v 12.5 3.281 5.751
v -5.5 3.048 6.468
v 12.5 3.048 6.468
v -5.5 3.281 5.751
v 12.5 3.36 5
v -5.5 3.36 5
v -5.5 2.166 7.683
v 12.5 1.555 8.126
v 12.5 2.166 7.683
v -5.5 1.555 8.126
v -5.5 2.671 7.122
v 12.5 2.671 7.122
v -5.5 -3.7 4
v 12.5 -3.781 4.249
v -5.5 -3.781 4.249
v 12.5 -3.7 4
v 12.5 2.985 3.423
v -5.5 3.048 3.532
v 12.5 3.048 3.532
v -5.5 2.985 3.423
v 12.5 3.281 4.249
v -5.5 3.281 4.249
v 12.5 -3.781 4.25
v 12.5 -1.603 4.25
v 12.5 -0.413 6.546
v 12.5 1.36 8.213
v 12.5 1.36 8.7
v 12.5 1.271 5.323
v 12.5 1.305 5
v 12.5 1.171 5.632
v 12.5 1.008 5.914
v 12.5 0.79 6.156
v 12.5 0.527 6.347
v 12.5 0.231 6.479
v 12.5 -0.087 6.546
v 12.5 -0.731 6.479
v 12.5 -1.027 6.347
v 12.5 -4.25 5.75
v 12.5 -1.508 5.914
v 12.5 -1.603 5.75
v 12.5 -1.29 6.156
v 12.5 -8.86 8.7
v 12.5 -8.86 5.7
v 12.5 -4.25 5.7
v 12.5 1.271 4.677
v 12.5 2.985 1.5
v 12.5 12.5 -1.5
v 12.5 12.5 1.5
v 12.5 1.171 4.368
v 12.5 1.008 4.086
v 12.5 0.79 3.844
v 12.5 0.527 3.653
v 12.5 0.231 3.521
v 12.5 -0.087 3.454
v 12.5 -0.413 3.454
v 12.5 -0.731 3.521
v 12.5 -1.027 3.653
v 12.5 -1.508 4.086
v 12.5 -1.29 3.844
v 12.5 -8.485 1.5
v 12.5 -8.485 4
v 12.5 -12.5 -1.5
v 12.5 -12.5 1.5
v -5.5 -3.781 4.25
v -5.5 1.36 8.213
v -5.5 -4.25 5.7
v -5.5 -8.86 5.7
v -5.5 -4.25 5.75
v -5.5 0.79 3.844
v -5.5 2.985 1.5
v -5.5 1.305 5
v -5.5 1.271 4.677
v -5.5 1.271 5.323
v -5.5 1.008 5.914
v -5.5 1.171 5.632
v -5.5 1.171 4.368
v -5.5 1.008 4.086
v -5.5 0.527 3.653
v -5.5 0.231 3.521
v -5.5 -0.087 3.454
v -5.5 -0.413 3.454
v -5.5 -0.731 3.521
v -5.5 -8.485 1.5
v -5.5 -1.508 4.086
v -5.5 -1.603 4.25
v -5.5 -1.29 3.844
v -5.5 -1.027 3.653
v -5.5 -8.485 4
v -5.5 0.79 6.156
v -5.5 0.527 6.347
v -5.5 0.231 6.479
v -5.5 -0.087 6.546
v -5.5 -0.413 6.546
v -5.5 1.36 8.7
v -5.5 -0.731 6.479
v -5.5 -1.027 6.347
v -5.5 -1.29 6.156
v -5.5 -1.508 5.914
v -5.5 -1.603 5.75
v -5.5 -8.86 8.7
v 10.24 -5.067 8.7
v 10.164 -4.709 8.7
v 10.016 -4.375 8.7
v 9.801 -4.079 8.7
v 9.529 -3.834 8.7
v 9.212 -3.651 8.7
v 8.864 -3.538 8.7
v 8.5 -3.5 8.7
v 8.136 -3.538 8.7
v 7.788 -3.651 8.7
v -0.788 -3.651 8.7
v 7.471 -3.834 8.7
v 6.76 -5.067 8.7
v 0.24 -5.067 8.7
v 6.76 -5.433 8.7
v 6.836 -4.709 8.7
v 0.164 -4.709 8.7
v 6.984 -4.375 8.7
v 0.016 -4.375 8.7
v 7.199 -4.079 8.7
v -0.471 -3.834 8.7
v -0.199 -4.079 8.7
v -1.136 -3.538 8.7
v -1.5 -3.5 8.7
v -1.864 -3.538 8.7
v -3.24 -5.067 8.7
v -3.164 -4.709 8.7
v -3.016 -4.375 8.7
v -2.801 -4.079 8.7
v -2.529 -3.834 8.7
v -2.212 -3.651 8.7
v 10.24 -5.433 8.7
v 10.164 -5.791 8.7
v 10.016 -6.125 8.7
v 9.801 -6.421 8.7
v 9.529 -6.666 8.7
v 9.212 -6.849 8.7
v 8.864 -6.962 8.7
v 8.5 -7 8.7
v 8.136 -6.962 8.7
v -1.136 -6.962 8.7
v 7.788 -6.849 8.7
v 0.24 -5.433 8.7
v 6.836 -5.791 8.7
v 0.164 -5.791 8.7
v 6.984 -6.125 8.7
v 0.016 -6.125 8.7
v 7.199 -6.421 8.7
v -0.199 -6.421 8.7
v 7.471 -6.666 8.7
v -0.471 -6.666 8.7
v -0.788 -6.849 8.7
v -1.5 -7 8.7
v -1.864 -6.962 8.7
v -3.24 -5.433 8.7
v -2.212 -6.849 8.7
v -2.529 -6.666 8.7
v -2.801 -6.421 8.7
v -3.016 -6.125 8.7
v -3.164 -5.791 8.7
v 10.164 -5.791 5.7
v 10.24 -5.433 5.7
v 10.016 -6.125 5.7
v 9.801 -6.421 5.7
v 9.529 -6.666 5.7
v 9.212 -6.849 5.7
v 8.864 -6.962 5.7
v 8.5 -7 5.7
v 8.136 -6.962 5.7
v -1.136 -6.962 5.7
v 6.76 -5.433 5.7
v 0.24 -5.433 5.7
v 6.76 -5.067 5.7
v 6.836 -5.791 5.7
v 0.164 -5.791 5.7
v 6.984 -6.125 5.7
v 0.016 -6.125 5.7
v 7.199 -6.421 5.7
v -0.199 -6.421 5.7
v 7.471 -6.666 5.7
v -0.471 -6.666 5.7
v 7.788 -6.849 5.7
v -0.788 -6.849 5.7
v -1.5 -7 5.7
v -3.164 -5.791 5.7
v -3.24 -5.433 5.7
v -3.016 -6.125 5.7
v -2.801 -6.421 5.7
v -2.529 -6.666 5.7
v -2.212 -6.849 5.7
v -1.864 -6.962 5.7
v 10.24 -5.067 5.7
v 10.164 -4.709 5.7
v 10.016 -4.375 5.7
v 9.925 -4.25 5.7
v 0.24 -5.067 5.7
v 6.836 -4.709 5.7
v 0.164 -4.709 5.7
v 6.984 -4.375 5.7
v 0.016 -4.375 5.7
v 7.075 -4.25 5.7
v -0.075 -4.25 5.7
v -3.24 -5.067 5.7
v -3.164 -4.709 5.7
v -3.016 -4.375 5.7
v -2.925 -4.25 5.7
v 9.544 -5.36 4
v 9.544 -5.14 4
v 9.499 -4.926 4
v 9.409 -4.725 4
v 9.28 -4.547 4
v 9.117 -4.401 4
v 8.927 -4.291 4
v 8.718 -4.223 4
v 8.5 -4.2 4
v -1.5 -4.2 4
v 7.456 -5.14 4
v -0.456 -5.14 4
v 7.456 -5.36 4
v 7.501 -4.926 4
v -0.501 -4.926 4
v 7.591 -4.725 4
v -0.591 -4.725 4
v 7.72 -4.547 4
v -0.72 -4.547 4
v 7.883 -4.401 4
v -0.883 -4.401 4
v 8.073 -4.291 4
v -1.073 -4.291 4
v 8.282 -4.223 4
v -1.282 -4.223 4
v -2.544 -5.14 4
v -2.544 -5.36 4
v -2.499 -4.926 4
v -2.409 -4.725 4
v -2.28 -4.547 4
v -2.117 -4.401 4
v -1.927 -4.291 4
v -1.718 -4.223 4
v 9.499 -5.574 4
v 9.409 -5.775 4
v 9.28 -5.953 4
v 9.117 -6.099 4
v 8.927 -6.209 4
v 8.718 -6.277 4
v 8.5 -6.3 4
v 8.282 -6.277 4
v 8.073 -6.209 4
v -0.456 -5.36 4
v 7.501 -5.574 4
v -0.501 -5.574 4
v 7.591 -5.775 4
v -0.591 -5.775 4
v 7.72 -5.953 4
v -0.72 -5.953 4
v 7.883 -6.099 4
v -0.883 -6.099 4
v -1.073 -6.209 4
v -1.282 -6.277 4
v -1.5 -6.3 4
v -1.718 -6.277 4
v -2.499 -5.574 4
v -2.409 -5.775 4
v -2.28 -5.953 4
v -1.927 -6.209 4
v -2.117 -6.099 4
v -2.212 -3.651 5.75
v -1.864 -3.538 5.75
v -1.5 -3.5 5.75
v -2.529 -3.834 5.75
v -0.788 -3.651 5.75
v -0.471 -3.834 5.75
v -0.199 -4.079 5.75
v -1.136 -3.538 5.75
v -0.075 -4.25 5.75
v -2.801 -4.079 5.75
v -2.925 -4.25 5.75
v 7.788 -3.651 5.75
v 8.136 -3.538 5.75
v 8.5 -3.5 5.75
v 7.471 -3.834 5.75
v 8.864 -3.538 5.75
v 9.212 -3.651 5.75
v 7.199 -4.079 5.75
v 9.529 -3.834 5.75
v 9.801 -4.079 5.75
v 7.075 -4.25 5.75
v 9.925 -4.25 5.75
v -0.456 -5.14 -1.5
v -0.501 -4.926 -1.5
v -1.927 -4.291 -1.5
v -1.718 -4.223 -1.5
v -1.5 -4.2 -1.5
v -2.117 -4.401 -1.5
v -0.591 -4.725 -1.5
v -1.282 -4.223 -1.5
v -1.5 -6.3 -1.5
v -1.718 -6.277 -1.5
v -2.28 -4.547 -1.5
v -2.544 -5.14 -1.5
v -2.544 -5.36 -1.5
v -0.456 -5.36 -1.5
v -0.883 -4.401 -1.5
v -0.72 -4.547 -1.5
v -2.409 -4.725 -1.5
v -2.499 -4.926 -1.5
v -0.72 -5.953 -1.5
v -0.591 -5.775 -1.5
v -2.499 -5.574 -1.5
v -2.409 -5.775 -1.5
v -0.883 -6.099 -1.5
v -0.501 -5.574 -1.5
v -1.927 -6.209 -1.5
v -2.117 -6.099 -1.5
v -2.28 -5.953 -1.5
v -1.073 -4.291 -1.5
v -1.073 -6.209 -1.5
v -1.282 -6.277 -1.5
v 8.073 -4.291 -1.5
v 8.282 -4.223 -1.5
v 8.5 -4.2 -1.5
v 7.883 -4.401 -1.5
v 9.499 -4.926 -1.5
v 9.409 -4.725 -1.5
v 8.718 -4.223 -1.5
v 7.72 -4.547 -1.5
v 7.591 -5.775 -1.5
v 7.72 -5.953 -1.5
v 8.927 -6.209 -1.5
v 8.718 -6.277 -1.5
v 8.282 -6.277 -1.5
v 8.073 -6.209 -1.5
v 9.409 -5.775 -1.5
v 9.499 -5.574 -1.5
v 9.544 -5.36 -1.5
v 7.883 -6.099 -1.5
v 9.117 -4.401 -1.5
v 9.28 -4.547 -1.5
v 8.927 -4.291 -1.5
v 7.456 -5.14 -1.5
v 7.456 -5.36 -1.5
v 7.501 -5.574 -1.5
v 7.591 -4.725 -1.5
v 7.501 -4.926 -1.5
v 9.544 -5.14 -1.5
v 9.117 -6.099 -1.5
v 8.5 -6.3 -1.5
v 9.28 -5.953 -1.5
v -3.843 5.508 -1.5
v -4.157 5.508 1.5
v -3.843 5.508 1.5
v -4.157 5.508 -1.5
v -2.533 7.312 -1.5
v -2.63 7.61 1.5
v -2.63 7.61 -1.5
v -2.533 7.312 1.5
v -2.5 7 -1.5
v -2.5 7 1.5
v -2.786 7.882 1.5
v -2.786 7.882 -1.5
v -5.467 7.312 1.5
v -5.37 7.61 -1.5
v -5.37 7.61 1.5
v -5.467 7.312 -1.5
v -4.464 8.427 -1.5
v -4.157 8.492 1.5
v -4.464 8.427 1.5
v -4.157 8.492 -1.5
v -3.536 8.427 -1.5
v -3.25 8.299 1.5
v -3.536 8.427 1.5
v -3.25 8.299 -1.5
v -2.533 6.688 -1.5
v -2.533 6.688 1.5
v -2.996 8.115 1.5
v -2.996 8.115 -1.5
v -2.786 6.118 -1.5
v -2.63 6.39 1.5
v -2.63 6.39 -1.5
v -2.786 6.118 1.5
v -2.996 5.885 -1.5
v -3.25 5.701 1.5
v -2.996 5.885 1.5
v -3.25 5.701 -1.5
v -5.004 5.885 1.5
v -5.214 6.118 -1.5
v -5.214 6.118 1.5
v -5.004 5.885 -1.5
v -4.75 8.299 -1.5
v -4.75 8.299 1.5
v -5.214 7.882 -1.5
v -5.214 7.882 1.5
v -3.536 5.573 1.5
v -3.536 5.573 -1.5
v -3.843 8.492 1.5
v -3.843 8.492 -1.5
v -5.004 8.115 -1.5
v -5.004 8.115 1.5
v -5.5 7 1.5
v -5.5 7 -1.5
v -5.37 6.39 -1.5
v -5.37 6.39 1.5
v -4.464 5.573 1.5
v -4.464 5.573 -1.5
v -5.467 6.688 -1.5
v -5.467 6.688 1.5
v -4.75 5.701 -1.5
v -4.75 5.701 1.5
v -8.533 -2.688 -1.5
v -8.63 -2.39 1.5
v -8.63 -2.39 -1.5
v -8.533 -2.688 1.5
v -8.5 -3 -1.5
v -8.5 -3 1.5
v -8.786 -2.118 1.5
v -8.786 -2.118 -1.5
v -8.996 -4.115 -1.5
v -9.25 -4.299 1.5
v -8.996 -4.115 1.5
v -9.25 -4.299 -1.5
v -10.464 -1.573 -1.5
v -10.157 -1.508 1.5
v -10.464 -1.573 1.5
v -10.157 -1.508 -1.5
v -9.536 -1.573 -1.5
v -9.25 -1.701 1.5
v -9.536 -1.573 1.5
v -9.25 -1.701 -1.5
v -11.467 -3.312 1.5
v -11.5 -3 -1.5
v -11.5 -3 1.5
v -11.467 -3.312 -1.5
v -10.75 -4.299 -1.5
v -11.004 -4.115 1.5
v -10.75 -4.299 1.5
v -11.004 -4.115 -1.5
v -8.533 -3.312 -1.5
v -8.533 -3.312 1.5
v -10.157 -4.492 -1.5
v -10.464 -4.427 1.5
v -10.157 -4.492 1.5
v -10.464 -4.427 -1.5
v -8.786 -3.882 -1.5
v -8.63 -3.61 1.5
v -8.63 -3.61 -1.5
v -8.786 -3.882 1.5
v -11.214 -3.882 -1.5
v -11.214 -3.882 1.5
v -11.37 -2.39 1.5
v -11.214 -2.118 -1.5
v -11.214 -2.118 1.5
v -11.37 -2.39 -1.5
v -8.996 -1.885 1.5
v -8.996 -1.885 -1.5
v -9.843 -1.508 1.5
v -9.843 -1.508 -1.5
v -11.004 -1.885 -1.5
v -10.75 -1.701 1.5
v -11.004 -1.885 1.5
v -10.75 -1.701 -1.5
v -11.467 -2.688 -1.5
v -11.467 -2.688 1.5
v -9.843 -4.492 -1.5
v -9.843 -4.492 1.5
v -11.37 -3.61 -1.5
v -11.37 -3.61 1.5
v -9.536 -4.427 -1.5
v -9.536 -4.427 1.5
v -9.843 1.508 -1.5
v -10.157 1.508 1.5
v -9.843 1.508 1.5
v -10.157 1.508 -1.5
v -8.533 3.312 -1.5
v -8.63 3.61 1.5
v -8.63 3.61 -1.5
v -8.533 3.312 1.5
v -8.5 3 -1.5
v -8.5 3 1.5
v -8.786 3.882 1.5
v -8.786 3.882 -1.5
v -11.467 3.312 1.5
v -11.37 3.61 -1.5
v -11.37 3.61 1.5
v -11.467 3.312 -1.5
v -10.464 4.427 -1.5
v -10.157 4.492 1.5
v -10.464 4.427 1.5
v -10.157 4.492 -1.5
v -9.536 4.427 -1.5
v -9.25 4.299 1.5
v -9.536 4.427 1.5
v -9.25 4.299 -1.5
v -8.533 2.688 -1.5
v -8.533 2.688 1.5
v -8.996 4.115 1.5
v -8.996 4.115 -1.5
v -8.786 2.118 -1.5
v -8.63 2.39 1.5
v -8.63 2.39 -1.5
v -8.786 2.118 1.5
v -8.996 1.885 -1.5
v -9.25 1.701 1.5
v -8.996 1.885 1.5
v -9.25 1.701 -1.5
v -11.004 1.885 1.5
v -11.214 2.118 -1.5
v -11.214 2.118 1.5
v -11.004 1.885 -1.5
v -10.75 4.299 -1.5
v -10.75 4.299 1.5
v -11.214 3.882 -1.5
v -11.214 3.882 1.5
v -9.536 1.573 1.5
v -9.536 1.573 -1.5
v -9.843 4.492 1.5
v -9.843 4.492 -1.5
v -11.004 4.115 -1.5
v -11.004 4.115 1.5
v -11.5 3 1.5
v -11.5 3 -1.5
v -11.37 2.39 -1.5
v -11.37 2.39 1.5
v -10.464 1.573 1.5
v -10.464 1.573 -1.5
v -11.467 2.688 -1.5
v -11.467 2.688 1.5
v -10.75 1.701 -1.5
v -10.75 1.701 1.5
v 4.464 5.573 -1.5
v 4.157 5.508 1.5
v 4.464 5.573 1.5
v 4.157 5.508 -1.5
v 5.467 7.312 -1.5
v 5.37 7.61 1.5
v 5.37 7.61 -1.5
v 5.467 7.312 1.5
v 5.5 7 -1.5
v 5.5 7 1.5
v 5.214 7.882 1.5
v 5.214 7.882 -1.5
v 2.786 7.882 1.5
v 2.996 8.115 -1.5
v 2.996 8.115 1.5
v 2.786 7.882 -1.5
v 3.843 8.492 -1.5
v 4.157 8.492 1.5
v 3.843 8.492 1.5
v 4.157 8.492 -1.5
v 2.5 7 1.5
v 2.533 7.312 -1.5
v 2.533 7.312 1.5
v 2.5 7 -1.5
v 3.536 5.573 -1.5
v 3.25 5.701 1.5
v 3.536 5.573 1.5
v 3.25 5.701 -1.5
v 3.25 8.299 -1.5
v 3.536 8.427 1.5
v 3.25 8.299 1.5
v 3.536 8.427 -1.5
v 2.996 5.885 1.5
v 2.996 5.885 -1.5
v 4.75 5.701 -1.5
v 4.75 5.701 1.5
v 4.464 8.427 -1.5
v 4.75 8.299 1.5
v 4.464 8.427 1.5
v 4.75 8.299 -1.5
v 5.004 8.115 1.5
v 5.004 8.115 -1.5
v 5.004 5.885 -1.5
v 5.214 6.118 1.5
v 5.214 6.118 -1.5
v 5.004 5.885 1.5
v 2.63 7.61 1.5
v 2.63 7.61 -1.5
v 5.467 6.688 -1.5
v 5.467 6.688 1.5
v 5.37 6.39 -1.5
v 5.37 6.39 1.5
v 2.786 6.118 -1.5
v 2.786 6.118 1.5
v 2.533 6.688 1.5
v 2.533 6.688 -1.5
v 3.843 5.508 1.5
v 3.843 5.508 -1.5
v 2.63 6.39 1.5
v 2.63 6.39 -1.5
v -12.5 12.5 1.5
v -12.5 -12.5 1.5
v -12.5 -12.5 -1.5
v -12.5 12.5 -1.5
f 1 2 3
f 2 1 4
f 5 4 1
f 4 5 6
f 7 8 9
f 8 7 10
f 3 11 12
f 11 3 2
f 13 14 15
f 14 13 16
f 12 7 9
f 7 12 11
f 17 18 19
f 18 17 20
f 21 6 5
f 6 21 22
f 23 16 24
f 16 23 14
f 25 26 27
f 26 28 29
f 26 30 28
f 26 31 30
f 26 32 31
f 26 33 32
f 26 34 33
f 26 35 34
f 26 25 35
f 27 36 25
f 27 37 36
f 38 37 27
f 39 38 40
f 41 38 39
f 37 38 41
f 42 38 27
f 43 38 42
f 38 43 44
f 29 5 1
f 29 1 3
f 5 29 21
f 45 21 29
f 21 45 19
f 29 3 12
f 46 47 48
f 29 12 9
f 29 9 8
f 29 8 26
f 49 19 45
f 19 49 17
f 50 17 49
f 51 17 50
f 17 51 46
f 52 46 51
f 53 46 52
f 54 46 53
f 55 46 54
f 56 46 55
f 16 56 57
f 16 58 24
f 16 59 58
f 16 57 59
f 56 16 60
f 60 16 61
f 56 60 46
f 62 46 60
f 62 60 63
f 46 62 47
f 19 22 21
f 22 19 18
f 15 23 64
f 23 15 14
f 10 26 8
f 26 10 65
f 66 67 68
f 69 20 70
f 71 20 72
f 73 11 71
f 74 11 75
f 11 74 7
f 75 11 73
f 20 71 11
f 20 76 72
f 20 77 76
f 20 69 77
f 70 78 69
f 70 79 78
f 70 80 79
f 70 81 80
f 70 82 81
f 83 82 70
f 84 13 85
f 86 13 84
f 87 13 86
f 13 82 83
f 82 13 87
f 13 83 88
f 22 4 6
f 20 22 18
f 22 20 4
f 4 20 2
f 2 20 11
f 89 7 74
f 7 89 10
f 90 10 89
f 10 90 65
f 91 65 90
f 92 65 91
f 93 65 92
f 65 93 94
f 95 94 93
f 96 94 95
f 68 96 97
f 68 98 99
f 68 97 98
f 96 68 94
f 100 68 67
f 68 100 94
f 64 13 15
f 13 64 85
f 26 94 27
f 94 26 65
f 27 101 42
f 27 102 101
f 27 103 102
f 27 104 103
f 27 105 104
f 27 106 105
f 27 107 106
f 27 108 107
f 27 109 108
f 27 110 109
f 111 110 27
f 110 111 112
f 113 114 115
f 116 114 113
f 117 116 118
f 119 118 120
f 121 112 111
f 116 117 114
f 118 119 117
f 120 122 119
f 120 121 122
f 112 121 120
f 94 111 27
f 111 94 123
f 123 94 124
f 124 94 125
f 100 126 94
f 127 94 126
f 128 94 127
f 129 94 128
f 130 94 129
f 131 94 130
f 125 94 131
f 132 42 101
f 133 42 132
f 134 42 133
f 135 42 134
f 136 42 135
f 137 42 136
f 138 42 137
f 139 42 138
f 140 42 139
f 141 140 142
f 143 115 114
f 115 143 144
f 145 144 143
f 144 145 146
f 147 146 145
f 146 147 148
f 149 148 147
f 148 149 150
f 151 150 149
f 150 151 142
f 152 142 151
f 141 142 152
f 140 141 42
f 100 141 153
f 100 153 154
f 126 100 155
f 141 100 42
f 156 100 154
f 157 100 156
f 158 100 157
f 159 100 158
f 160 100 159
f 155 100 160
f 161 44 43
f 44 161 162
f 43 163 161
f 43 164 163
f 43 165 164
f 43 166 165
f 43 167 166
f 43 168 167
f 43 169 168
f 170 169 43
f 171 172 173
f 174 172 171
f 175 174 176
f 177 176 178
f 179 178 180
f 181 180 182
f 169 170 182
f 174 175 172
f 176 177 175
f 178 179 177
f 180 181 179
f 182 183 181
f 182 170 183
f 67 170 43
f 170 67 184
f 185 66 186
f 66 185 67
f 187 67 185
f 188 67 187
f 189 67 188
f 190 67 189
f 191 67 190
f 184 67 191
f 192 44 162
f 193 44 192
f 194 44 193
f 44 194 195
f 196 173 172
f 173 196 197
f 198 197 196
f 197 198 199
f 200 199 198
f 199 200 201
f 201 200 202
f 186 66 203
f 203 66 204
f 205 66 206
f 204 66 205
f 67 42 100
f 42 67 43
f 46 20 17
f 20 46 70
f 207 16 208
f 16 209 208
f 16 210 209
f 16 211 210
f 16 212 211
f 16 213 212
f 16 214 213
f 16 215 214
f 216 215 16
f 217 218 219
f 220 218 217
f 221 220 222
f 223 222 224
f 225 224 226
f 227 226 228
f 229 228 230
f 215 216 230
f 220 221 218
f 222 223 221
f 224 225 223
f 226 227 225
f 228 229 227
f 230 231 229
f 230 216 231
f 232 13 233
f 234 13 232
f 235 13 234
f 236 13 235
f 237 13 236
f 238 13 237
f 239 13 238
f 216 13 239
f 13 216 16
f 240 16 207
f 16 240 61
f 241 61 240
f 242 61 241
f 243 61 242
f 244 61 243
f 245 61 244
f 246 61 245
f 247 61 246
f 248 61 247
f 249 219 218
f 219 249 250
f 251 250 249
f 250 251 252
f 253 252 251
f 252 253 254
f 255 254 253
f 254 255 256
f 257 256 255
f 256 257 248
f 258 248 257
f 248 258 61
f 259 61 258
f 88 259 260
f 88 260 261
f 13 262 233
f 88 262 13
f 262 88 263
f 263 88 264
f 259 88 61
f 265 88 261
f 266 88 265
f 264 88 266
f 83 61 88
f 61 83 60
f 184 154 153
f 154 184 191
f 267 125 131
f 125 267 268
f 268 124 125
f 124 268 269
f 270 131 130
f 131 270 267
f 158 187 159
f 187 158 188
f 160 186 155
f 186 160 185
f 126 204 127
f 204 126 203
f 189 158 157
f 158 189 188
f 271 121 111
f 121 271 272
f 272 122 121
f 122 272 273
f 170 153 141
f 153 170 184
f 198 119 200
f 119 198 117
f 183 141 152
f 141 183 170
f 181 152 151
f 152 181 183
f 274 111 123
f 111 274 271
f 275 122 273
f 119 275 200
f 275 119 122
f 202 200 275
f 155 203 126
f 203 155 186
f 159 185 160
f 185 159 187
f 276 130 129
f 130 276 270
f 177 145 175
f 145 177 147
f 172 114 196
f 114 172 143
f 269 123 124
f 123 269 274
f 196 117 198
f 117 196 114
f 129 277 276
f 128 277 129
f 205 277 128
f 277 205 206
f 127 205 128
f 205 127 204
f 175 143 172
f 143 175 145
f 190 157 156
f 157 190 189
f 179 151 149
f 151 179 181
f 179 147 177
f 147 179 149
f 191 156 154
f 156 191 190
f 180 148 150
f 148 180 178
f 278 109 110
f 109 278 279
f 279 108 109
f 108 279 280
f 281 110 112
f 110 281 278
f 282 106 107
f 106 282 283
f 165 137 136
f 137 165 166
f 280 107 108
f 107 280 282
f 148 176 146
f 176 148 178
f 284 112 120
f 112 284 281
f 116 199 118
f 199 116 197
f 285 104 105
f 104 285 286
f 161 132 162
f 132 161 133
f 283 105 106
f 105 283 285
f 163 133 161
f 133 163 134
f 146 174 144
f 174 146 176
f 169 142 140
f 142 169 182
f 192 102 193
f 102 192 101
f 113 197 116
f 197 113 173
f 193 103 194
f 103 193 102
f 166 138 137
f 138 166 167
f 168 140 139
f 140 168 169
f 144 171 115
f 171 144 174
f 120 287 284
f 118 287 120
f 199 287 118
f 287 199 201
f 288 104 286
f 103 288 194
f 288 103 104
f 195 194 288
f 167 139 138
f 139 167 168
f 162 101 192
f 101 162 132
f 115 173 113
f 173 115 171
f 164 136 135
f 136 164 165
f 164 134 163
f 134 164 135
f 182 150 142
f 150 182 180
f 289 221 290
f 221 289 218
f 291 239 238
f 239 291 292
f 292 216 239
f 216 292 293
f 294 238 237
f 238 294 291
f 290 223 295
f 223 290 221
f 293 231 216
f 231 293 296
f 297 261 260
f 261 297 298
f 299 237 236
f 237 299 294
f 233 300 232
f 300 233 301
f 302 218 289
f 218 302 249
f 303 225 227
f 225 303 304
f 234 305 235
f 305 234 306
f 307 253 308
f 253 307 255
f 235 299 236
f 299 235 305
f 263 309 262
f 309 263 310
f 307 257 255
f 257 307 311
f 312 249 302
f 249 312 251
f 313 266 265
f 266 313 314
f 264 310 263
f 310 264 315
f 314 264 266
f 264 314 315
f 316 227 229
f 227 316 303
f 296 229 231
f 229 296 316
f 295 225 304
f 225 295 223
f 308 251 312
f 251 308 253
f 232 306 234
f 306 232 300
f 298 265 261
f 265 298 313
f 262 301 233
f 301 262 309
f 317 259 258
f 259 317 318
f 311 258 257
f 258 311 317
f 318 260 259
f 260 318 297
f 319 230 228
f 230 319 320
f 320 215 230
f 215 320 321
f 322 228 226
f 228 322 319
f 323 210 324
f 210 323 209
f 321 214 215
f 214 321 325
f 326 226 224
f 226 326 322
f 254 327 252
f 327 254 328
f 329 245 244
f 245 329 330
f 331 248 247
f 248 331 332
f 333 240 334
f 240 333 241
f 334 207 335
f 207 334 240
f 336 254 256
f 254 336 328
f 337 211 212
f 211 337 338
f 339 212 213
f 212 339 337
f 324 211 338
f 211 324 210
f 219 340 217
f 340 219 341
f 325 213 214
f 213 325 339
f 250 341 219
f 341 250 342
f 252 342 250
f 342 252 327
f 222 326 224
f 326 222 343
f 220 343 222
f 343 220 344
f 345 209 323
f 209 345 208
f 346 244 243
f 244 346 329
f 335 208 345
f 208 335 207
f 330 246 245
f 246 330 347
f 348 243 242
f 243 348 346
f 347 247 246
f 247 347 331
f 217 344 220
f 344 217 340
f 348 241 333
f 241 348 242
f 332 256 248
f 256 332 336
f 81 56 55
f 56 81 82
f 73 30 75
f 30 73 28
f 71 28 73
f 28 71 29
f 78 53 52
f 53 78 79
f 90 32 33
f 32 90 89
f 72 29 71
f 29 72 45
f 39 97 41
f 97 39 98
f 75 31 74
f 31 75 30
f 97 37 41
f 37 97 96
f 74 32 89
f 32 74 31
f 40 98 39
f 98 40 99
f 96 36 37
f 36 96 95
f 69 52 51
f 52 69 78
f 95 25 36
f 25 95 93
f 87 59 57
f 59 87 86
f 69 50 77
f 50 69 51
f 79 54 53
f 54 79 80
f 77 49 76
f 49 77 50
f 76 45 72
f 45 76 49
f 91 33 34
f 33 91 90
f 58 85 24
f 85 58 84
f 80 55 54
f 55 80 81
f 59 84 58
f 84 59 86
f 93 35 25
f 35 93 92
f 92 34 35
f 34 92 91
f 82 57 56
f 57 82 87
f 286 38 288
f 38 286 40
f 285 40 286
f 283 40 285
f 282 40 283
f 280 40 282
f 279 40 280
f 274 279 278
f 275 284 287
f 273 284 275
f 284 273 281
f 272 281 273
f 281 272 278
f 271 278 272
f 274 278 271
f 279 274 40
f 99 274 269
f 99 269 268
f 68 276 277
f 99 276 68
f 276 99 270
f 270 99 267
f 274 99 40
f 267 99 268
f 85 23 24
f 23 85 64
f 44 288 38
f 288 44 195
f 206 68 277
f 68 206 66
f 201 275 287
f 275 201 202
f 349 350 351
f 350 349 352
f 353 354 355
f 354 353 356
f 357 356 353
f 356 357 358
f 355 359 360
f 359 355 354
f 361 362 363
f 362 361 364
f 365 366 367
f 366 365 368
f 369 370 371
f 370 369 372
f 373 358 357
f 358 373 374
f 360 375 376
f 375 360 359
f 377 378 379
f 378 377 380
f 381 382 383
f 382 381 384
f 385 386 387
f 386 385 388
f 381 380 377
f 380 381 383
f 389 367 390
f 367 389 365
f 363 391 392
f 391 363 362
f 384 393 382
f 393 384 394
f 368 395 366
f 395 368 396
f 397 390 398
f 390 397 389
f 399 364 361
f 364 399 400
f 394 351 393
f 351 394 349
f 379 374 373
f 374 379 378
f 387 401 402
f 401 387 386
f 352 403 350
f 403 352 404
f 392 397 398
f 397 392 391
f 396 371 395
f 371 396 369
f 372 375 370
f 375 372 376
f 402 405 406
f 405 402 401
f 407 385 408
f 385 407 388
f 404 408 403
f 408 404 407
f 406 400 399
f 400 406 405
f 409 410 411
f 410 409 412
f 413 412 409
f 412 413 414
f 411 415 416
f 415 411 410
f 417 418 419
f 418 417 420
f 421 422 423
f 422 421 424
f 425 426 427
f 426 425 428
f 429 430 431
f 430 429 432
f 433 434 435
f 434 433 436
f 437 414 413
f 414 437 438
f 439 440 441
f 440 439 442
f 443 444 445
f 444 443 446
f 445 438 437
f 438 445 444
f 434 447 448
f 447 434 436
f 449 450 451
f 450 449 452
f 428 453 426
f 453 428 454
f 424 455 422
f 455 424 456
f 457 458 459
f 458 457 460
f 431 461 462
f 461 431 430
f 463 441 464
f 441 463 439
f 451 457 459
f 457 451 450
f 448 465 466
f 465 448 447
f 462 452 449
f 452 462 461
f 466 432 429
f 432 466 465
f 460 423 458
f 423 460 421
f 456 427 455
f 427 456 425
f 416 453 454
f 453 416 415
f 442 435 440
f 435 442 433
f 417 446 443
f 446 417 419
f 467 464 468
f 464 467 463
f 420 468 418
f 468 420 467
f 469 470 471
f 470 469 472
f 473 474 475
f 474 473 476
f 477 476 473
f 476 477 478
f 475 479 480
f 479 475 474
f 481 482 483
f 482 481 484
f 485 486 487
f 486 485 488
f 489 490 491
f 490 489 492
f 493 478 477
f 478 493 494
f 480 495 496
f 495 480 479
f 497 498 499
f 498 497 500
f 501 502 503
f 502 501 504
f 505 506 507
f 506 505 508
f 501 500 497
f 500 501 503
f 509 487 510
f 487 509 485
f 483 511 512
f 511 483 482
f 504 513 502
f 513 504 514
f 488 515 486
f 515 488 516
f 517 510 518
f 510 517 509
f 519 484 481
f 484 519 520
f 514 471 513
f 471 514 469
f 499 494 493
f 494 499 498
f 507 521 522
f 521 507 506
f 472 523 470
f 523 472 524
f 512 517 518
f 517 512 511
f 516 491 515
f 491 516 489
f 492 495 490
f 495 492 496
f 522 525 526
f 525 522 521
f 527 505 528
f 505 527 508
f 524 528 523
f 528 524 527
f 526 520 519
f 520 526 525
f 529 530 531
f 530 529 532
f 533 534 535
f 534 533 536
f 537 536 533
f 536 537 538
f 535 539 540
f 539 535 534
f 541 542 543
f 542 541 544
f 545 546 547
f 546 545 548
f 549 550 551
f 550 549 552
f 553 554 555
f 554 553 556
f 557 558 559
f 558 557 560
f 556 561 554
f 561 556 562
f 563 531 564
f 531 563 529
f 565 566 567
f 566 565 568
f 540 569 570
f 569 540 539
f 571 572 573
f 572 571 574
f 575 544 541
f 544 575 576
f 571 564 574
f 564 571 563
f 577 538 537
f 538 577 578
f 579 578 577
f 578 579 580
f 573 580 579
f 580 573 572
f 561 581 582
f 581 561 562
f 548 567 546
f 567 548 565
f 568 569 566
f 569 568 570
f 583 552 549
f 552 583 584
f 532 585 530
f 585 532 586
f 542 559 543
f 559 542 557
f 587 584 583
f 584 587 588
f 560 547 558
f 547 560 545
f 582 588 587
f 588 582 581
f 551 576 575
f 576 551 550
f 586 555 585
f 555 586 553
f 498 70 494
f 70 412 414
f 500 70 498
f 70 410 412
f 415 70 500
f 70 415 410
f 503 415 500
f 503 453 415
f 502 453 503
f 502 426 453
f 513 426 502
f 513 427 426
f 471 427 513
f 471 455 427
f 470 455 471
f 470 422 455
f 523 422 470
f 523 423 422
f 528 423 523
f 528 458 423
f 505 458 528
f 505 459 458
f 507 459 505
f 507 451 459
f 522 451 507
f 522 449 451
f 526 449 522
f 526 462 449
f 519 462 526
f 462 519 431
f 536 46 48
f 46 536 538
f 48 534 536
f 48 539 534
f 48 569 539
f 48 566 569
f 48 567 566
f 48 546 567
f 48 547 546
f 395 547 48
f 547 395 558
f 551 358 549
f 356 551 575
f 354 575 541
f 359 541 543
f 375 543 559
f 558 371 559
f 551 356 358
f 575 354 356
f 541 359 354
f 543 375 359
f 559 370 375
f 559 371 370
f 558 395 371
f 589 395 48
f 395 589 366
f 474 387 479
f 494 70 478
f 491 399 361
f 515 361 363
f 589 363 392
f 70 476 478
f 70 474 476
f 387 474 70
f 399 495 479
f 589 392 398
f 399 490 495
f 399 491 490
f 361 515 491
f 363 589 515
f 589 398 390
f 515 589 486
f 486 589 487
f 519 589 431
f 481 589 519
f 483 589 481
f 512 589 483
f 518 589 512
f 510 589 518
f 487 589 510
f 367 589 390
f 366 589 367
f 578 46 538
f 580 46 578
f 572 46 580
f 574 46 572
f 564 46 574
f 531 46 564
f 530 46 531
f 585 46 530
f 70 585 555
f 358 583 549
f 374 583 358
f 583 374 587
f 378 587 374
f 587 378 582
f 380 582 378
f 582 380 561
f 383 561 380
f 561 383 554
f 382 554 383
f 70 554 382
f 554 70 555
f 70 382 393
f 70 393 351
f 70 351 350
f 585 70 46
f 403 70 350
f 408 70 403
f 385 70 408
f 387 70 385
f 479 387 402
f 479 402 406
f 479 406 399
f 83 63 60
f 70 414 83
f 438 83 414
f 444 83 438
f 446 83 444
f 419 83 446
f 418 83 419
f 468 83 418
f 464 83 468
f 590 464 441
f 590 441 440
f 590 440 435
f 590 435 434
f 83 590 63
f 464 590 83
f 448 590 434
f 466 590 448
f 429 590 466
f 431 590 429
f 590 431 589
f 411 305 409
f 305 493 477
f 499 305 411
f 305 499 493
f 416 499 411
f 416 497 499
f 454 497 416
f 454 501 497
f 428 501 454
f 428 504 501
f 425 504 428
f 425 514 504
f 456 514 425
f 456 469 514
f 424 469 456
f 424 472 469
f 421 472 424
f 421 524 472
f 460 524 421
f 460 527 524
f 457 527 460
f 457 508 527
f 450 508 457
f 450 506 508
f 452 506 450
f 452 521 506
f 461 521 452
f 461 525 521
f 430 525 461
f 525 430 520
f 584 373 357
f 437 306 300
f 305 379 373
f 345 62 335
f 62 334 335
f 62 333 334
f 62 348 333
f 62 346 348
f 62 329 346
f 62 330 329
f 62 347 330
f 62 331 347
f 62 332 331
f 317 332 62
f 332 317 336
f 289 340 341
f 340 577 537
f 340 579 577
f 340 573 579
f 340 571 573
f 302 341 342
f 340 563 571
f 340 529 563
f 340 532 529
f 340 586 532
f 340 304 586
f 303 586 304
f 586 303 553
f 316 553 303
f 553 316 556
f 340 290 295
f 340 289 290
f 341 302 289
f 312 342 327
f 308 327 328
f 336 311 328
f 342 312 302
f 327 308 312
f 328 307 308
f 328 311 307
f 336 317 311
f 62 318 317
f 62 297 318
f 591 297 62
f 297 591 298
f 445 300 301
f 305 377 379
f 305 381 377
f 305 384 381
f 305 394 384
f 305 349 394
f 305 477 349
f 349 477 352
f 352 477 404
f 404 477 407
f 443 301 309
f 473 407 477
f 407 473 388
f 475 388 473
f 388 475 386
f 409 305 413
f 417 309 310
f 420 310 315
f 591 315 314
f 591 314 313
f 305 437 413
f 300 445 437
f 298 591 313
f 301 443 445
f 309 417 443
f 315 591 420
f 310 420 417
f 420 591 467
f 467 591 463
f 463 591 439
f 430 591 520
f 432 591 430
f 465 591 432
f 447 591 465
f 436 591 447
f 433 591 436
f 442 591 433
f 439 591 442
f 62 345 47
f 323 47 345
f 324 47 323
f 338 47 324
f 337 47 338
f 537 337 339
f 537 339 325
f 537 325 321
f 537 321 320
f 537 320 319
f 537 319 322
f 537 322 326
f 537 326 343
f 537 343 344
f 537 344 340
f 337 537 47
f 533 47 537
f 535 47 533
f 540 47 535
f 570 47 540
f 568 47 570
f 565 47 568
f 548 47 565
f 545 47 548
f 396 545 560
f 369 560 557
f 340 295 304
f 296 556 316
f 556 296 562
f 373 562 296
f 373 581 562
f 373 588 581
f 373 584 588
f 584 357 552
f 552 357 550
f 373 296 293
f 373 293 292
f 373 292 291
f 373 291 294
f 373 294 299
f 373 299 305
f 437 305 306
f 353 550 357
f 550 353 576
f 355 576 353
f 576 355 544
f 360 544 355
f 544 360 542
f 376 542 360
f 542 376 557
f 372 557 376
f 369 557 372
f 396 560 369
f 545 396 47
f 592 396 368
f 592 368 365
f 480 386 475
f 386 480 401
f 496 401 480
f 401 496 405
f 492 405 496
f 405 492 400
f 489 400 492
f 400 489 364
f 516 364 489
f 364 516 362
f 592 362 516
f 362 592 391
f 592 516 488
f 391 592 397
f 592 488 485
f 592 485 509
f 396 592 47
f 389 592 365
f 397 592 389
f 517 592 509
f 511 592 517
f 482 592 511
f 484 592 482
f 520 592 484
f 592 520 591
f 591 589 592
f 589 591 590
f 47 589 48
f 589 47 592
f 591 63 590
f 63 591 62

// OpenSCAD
SPINE=3.11;
$fn=30;

module _clamp() {
    difference() {
        union() {
            rotate([90, 0])
                cylinder(d=SPINE*2+1, h=18, center=true);

            translate([-3.5, 0, 2.2])
                cube([SPINE*2+4, 18, 3], center=true);    
            translate([-2.5, 0, -2.5])
                cube([SPINE*2+5.25, 18, 3], center=true);
            }
        spine();
        slot();
        clamp_holes();
    }
}


module screw_hole() {
    cylinder(d=3, h=15, center=true);
}

module carriage_holes_custom() {
    //translate([-4, -7]) screw_hole();
    translate([-4, 7]) screw_hole();
    translate([-10, -3]) screw_hole();
    translate([-10, 3]) screw_hole();

    //translate([4, -7]) screw_hole();
    translate([4, 7]) screw_hole();
    //translate([10, -3]) screw_hole();
    //translate([10, 3]) screw_hole();
    
    //translate([4, -12, -10]) screw_hole();
    //translate([4, 12, -10]) screw_hole();    
    //translate([-4, -12, -10]) screw_hole();
    //translate([-4, 12, -10]) screw_hole();    
}

module clamp_holes() {
    translate([-5, 0]) {
        translate([0, 5]) 
            cylinder(d=3.5, h=5);

        translate([0, -5]) 
            cylinder(d=3.5, h=5);
    
        translate([0, 5]) 
            cylinder(d=2.1, h=20, center=true);

        translate([0, -5]) 
            cylinder(d=2.1, h=20, center=true);    
    }
}

module slot() {
    translate([-2, 0])
        cube([4, 30, 1.5], center=true);
}

module spine() {
    rotate([90, 0])
        cylinder(d=SPINE, h=50, center=true);
}

module carriage() {
    difference() {
        cube([27, 27, 4], center=true);
        translate([0, 0]) {
            translate([10, 10]) 
                cylinder(d=3.2, h=15, center=true);

            translate([-10, -10]) 
                cylinder(d=3.2, h=15, center=true);

            translate([-10, 10]) 
                cylinder(d=3.2, h=15, center=true);

            translate([10, -10]) 
                cylinder(d=3.2, h=15, center=true);    
        }
    }
}

module base() {
    difference() {
        cube([25,25,3], center=true);
            carriage_holes_custom();
        
        translate([3.5, -.25, 5]) 
            rotate([0,0,90])
                clamp_holes();
    }
}

module clamps() {
    translate([3.5, -.25, 5]) 
        rotate([0,0,90])
            _clamp();
   // translate([0, 9, 5]) 
   //     rotate([0,0,-90])
   //         _clamp();    
}

clamps();
base();

/*
difference() {
    union() {
        //translate([0, 0, 5])
            clamp();
        translate([0,0,-5])
            base();
        //translate([0, 0,-6]) carriage();
        //carriage_custom();
    }
    //translate([0, 0, 5]) {
       # spine();
       # slot();
       clamp_holes_basic();
    //}
    
    //clamp_holes_custom();
}
*/
